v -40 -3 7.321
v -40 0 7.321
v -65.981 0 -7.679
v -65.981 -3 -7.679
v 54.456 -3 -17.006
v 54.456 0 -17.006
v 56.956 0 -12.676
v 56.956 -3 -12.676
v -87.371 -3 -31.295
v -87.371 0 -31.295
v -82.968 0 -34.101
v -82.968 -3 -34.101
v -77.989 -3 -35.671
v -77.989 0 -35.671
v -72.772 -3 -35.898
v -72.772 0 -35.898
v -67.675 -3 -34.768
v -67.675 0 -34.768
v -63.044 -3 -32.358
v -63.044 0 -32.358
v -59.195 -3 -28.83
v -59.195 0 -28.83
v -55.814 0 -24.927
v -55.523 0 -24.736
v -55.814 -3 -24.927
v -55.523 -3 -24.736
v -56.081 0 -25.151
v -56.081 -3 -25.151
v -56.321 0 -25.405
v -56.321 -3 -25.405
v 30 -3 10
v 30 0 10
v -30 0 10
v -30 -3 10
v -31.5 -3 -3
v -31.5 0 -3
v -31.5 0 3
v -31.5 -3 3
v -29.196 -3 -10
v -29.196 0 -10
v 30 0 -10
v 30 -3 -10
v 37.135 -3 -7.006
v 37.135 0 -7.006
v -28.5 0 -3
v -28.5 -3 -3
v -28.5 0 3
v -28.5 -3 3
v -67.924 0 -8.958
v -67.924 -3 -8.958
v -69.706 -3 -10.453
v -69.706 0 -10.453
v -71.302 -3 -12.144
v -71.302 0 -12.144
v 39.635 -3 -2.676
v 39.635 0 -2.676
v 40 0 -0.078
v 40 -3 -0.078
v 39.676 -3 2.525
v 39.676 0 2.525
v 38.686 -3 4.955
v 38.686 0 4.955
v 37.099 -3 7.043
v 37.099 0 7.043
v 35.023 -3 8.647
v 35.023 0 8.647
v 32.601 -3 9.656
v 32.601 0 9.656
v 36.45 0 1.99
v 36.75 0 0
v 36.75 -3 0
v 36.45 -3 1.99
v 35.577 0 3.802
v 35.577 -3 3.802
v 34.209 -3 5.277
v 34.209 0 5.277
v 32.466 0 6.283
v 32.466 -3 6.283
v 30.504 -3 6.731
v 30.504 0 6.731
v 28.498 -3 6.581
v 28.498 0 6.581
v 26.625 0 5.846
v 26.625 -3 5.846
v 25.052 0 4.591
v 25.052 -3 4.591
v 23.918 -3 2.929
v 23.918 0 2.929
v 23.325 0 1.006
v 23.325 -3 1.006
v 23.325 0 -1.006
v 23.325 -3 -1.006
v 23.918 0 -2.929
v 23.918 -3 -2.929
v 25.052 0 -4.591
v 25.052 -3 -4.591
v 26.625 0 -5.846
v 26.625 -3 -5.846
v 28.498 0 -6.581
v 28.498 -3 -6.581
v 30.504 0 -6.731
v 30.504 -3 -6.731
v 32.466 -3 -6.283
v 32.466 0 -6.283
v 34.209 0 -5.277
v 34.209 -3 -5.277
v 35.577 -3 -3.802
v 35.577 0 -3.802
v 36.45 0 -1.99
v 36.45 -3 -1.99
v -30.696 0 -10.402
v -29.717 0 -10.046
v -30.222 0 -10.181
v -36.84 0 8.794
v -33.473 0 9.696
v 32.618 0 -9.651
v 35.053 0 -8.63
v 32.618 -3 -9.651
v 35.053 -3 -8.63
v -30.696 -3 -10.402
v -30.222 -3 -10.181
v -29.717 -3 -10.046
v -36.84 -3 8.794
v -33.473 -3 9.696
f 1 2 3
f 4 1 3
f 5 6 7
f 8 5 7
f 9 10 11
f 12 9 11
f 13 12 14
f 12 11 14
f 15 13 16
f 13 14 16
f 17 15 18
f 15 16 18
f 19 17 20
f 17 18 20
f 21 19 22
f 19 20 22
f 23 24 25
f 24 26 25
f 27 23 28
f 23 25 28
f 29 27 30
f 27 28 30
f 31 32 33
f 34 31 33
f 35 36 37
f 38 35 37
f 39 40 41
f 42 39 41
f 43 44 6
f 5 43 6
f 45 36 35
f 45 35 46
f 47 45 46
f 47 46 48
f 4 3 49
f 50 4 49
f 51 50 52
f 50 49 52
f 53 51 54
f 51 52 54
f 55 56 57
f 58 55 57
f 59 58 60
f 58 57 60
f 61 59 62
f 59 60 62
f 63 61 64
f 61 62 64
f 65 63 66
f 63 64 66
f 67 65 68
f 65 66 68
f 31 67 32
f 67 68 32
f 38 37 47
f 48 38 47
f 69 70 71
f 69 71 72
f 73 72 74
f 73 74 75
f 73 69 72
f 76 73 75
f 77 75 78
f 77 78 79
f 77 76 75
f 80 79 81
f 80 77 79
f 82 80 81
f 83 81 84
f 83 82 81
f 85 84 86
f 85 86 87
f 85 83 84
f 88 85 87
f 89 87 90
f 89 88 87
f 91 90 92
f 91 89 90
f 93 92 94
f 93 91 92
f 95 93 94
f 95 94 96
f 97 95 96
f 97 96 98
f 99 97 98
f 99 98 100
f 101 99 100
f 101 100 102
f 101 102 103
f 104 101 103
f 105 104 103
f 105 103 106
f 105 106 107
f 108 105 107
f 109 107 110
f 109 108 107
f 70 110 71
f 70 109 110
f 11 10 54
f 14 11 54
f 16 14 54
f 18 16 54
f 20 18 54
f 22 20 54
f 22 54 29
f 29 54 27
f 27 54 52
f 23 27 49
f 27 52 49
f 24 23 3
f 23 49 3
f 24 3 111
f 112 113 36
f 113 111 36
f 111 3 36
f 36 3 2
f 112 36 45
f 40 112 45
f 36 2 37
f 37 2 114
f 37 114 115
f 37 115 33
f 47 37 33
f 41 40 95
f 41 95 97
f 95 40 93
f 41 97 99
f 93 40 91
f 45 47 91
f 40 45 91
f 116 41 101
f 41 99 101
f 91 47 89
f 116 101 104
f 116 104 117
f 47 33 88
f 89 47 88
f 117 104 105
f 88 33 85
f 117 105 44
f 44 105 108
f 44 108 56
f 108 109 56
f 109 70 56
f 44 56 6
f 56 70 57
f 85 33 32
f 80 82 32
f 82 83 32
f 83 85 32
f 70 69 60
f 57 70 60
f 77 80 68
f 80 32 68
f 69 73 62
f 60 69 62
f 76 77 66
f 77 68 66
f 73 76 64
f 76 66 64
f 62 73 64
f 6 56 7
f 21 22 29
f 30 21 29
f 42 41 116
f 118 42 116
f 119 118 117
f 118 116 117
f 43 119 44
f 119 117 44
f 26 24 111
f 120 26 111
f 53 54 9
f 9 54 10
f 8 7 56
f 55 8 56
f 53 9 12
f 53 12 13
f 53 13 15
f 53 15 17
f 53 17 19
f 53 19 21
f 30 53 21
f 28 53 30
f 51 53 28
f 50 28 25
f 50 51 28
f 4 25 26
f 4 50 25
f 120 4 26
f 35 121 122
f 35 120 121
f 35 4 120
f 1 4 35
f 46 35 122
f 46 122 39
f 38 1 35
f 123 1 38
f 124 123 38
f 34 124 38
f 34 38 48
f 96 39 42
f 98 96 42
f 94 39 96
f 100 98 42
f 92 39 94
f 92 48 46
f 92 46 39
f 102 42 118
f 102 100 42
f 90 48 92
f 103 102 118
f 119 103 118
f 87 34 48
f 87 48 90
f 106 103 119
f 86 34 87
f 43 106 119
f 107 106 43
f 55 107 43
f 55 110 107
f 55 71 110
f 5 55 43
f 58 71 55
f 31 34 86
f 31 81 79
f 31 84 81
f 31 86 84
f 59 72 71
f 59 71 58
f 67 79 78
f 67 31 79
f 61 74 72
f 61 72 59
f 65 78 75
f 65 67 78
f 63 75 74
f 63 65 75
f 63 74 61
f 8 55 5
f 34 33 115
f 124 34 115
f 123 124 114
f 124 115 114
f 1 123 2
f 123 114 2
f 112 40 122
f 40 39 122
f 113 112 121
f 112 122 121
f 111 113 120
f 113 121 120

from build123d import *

# Parameters (mm, degrees)
F0_W     = 3
F0_H     = 6
F0_R     = 6.75
F1_DEPTH = 3
F2_R     = 3


with BuildPart() as f1:
    # F0 (on Front) → F1 (new body)
    with BuildSketch(Plane.XZ):
        with BuildLine():
            Line((-30, -10), (30, -10))
            ThreePointArc((30, -10), (33.868919, -9.221251), (37.135255, -7.006293))
            Line((37.135255, -7.006293), (54.455763, -17.006293))
            Line((54.455763, -17.006293), (56.955763, -12.676166))
            Line((56.955763, -12.676166), (39.635255, -2.676166))
            ThreePointArc((39.635255, -2.676166), (37.961208, 6.051378), (30, 10))
            Line((30, 10), (-30, 10))
            ThreePointArc((-30, 10), (-35.176381, 9.318517), (-40, 7.320508))
            Line((-40, 7.320508), (-65.980762, -7.679492))
            ThreePointArc((-65.980762, -7.679492), (-68.836514, -9.679111), (-71.301651, -12.144248))
            Line((-71.301651, -12.144248), (-87.371341, -31.295359))
            ThreePointArc((-87.371341, -31.295359), (-72.772474, -35.898364), (-59.1947, -28.830222))
            Line((-59.1947, -28.830222), (-55.980762, -25))
            Line((-55.980762, -25), (-30, -10))
        make_face()
        with Locations((-30, 0)):
            Rectangle(F0_W, F0_H, mode=Mode.SUBTRACT)
        with Locations((30, 0)):
            Circle(F0_R, mode=Mode.SUBTRACT)
    extrude(amount=F1_DEPTH)

    # F2
    f2_edges = [f1.edges().sort_by_distance(p)[0] for p in [
        (-30, -1.5, -10),
        (-55.980762, -1.5, -25),
    ]]
    fillet(f2_edges, radius=F2_R)


solid = f1.part
